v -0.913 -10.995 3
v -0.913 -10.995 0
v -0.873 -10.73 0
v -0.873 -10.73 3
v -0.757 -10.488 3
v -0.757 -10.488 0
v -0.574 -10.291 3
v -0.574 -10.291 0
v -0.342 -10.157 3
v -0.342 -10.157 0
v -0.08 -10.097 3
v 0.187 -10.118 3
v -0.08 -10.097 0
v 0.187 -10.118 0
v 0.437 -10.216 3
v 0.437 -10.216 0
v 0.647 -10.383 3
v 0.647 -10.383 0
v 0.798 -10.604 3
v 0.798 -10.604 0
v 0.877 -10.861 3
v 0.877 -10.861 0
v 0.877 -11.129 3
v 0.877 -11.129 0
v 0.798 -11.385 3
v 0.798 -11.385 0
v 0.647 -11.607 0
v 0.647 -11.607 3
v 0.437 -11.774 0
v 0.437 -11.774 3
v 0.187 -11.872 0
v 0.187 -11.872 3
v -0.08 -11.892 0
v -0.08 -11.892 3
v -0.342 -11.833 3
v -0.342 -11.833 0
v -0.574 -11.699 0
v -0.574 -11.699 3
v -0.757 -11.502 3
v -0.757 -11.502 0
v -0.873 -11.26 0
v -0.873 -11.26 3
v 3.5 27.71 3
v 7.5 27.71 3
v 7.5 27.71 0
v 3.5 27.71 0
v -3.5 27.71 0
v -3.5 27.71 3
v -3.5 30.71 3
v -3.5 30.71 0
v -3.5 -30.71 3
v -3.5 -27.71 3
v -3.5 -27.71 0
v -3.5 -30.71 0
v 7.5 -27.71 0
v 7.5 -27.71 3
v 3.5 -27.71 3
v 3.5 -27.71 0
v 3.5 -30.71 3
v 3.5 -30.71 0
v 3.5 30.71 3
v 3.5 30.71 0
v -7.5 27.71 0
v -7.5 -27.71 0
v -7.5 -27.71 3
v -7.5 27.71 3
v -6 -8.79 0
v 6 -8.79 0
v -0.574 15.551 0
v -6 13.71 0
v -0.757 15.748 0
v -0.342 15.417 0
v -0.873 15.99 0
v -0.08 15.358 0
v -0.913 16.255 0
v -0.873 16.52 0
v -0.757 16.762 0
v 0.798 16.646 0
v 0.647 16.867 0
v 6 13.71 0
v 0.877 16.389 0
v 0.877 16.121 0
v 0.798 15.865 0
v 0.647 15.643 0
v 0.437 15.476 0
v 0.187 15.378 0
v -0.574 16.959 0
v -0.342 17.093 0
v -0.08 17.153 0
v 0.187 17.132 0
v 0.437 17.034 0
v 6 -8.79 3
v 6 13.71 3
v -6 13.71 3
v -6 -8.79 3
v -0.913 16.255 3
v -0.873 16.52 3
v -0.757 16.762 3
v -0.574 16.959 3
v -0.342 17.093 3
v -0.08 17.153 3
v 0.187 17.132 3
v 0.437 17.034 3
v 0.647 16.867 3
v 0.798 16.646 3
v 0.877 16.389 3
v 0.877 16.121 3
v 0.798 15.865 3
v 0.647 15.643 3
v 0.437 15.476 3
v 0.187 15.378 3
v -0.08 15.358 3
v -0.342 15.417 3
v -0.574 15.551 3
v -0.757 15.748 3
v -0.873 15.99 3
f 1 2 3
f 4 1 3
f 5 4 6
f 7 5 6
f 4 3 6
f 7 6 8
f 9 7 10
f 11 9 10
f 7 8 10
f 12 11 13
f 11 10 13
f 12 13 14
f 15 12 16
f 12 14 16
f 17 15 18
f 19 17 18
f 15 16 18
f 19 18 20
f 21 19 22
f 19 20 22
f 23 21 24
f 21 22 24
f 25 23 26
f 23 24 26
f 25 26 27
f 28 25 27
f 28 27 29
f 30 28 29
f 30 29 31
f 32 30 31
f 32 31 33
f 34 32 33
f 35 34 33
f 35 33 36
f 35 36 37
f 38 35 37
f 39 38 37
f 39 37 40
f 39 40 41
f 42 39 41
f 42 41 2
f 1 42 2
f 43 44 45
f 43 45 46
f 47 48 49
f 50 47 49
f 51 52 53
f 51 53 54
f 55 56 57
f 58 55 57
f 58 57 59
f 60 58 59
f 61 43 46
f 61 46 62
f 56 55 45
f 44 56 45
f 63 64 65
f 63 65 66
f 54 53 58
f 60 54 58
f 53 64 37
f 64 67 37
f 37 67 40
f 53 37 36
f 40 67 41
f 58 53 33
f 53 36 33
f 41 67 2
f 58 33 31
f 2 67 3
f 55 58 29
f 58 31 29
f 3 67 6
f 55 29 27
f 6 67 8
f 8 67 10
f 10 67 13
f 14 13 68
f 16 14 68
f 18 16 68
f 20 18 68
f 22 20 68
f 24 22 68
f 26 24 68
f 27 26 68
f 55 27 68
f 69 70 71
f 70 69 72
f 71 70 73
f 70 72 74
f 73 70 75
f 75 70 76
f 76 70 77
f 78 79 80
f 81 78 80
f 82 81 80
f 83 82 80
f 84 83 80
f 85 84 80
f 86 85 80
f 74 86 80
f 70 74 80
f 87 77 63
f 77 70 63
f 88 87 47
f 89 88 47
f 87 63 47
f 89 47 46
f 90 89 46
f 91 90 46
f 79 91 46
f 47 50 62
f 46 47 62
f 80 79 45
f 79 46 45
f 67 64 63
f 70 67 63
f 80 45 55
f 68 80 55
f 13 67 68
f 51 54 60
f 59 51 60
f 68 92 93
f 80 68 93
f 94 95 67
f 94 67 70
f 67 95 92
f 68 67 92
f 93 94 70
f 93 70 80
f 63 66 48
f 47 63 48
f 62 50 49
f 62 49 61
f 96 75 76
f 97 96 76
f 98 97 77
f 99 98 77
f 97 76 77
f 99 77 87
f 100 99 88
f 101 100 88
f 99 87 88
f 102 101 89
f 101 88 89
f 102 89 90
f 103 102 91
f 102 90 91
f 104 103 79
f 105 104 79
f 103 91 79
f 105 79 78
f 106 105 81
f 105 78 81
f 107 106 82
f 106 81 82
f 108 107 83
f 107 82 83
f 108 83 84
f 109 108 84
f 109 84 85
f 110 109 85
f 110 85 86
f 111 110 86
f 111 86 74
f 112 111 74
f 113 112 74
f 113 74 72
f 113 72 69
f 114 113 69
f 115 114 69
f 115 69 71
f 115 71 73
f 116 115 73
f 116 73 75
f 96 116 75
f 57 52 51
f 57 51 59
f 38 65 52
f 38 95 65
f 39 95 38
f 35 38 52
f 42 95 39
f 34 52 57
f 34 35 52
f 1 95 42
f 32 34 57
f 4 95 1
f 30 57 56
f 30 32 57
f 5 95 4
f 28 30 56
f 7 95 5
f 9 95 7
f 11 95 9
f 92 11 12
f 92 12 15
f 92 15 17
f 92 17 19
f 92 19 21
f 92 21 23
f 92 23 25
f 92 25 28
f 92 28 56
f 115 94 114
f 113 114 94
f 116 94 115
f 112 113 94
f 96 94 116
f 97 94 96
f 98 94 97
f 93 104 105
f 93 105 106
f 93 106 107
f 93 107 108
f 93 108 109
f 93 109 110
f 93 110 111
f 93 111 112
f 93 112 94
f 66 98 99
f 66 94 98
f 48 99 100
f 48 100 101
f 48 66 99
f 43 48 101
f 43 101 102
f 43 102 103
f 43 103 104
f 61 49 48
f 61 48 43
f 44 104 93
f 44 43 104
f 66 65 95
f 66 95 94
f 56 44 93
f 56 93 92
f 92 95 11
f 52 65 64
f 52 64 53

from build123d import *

# Parameters (mm, degrees)
SKETCH1_W               = 15
SKETCH1_H               = 61.42
BOSS_EXTRUDE2_DEPTH     = 3
SKETCH4_W               = 4
SKETCH4_H               = 3
CUT_EXTRUDE2_DEPTH      = 3
MIRROR2_COPY_1_SKETCH_W = 4
MIRROR2_COPY_1_SKETCH_H = 3
MIRROR2_COPY_1_DEPTH    = 3
SKETCH5_W               = 12
SKETCH5_H               = 22.5
CUT_EXTRUDE3_DEPTH      = 3
SKETCH7_R               = 0.9
CUT_EXTRUDE4_DEPTH      = 4


with BuildPart() as part:
    # Sketch1 → Boss-Extrude2 (new body)
    with BuildSketch(Plane.XY):
        Rectangle(SKETCH1_W, SKETCH1_H)
    extrude(amount=BOSS_EXTRUDE2_DEPTH)

    # Sketch4 → Cut-Extrude2 (cut)
    with BuildSketch(Plane.XY.offset(3)):
        with Locations((-5.5, 29.21)):
            Rectangle(SKETCH4_W, SKETCH4_H)
    cut_extrude2 = extrude(amount=-CUT_EXTRUDE2_DEPTH, mode=Mode.SUBTRACT)

    # Mirror1: Cut-Extrude2 across plane
    add(cut_extrude2.mirror(Plane(origin=(0, 0, 0), x_dir=(0, 0, 1), z_dir=(1, 0, 0))), mode=Mode.SUBTRACT)

    # Mirror2: Cut-Extrude2 across plane
    add(cut_extrude2.mirror(Plane.ZX), mode=Mode.SUBTRACT)

    # Mirror2 copy 1 sketch → Mirror2 copy 1 (cut)
    with BuildSketch(Plane(origin=(0, 0, 3), x_dir=(-1, 0, 0), z_dir=(0, 0, 1))):
        with Locations((-5.5, 29.21)):
            Rectangle(MIRROR2_COPY_1_SKETCH_W, MIRROR2_COPY_1_SKETCH_H)
    extrude(amount=-MIRROR2_COPY_1_DEPTH, mode=Mode.SUBTRACT)

    # Sketch5 → Cut-Extrude3 (cut)
    with BuildSketch(Plane.XY.offset(3)):
        with Locations((0, 2.46)):
            Rectangle(SKETCH5_W, SKETCH5_H)
    extrude(amount=-CUT_EXTRUDE3_DEPTH, mode=Mode.SUBTRACT)

    # Sketch7 → Cut-Extrude4 (cut, through all)
    with BuildSketch(Plane(origin=(0, 0, 0), x_dir=(-1, 0, 0), z_dir=(0, 0, -1))):
        with Locations((0.012913573, 16.255029587)):
            Circle(SKETCH7_R)
        with Locations((0.012913573, -10.994970413)):
            Circle(SKETCH7_R)
    extrude(amount=-CUT_EXTRUDE4_DEPTH, mode=Mode.SUBTRACT)


solid = part.part
